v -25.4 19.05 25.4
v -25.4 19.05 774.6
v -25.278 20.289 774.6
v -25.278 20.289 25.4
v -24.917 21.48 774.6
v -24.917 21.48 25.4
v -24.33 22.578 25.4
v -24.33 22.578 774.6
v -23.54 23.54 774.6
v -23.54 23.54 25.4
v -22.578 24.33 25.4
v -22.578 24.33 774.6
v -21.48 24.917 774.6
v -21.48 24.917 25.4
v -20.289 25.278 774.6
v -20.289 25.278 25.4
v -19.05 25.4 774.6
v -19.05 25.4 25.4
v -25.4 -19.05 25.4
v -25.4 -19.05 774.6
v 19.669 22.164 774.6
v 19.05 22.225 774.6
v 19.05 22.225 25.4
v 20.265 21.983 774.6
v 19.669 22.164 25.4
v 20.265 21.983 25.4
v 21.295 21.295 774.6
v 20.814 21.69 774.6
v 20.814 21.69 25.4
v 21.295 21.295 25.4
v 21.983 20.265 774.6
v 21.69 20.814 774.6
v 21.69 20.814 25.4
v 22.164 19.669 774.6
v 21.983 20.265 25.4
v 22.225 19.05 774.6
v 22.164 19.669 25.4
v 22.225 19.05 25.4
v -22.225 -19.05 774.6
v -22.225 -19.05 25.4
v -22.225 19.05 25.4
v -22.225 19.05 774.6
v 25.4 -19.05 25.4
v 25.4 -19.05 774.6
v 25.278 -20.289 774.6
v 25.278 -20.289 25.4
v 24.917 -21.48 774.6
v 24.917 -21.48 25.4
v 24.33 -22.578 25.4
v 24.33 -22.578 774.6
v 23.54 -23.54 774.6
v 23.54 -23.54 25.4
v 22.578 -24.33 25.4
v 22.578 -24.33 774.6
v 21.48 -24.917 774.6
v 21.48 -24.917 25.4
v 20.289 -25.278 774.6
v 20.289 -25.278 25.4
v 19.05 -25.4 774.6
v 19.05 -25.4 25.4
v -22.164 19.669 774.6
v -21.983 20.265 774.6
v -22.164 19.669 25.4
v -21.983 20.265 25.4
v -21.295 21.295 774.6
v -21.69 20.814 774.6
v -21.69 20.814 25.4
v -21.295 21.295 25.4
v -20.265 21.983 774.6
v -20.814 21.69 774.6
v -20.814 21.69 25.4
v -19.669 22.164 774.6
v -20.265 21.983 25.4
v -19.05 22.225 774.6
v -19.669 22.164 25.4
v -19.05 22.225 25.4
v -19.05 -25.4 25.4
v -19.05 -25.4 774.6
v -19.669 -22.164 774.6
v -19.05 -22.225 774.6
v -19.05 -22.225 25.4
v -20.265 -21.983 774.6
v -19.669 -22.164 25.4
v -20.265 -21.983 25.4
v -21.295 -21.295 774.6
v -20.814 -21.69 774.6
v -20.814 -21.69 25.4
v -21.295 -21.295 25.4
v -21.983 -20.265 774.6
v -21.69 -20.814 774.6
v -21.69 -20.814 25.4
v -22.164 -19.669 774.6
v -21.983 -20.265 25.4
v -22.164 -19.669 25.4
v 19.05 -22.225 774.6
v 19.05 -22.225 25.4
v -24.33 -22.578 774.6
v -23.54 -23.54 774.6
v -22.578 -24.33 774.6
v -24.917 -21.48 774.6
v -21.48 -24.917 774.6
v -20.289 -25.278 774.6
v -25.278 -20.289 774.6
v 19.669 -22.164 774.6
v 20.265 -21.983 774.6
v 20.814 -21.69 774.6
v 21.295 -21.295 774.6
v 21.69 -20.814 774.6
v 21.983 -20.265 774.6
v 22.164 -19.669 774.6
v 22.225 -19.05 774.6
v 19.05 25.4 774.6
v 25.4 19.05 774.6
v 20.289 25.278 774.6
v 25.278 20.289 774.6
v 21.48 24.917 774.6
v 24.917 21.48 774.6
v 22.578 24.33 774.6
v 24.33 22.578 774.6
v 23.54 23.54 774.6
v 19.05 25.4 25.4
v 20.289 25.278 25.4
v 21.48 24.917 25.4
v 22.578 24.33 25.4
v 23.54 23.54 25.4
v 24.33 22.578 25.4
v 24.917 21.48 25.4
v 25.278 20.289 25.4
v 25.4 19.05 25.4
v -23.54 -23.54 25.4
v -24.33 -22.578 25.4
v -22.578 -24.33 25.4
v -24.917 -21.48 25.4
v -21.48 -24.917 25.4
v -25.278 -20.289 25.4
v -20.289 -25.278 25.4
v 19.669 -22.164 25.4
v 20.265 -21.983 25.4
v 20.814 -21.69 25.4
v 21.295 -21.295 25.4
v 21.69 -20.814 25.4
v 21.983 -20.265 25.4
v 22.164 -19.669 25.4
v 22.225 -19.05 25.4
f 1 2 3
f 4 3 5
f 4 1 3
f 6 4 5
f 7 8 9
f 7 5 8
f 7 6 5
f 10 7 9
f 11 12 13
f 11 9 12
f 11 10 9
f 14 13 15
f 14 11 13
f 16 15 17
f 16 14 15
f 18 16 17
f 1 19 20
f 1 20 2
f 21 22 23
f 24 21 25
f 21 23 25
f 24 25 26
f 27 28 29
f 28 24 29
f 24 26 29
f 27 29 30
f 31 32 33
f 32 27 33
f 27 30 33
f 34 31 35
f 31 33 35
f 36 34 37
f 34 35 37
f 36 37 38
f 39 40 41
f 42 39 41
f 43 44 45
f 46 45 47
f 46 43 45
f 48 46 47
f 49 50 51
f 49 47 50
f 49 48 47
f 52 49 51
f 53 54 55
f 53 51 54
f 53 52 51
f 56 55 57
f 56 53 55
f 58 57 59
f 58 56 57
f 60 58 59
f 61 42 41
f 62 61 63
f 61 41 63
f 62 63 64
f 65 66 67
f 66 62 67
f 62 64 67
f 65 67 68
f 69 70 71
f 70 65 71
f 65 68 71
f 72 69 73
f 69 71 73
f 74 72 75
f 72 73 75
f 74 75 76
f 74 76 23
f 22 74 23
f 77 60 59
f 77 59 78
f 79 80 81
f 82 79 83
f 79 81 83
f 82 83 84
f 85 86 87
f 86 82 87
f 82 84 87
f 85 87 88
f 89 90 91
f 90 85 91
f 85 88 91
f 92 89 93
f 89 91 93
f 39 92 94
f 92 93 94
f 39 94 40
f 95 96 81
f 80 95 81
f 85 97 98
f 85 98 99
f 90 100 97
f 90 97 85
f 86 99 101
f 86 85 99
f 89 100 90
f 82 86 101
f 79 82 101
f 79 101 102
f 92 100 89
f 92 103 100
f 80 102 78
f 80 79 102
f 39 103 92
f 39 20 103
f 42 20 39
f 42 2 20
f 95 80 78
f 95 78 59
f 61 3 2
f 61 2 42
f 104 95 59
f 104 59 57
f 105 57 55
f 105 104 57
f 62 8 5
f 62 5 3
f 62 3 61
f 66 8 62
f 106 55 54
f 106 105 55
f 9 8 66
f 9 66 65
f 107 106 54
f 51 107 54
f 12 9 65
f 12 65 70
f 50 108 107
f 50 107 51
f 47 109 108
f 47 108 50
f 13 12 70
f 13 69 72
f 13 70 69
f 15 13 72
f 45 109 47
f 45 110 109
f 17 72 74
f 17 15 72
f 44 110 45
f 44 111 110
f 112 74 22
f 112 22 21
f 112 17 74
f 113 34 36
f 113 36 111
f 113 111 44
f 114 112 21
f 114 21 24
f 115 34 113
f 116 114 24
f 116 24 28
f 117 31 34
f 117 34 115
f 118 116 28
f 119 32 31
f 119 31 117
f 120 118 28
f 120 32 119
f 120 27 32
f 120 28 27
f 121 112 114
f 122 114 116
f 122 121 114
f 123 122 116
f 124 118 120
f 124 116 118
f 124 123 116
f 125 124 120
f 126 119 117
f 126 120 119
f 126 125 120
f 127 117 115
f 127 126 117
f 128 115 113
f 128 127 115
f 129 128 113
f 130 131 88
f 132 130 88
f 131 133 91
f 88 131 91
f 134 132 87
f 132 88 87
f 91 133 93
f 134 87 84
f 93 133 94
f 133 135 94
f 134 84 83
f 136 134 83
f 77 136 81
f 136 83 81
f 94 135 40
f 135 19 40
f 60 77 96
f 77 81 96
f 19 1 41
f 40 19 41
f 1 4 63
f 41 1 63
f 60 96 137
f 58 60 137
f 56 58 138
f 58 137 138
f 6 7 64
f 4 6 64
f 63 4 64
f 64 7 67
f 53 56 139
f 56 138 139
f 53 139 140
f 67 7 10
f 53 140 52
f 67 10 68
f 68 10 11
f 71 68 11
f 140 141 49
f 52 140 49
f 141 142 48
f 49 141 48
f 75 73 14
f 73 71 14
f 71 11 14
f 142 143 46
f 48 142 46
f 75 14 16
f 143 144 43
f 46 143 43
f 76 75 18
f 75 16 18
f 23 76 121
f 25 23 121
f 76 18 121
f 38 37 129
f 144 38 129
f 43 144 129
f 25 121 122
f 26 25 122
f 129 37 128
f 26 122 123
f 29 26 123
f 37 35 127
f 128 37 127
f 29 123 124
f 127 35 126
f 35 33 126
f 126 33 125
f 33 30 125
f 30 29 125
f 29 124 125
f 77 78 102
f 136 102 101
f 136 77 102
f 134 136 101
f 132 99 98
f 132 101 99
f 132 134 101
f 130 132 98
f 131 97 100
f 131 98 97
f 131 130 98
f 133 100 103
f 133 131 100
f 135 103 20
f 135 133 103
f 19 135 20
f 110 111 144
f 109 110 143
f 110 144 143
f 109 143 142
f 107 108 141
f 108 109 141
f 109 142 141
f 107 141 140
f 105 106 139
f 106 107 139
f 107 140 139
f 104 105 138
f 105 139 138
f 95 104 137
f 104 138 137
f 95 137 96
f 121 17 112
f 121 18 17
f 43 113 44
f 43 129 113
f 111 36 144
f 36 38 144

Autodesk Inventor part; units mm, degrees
ref_plane "Plano inicial" through (0, 0, 25.4) normal (0, 0, 1) x (1, 0, 0)
ref_plane "Plano final" through (0, 0, 774.6) normal (0, 0, 1) x (1, 0, 0)
sketch "Boceto" plane through (0, 0, 0) normal (0, 0, 1) x (1, 0, 0)
  line L0 (-25.4, -19.05) -> (-25.4, 19.05)
  line L1 (-19.05, 25.4) -> (19.05, 25.4)
  line L2 (25.4, 19.05) -> (25.4, -19.05)
  line L3 (19.05, -25.4) -> (-19.05, -25.4)
  arc A0 (-25.4, -19.05) -> (-19.05, -25.4) centre (-19.05, -19.05) ccw
  arc A1 (-19.05, 25.4) -> (-25.4, 19.05) centre (-19.05, 19.05) ccw
  arc A2 (25.4, 19.05) -> (19.05, 25.4) centre (19.05, 19.05) ccw
  arc A3 (19.05, -25.4) -> (25.4, -19.05) centre (19.05, -19.05) ccw
  arc A4 (-19.05, 22.225) -> (-22.225, 19.05) centre (-19.05, 19.05) ccw
  line L4 (-19.05, 22.225) -> (19.05, 22.225)
  arc A5 (22.225, 19.05) -> (19.05, 22.225) centre (19.05, 19.05) ccw
  line L5 (22.225, 19.05) -> (22.225, -19.05)
  arc A6 (19.05, -22.225) -> (22.225, -19.05) centre (19.05, -19.05) ccw
  line L6 (19.05, -22.225) -> (-19.05, -22.225)
  arc A7 (-22.225, -19.05) -> (-19.05, -22.225) centre (-19.05, -19.05) ccw
  line L7 (-22.225, -19.05) -> (-22.225, 19.05)
  line L8 (0, 37.4012) -> (0, -37.4012) construction
  line L9 (-37.4012, 0) -> (37.4012, 0) construction
  dimension "d10" = 50.8
  dimension "d11" = 50.8
  dimension "d12" = 3.175
  dimension "d15" = 25.4
  dimension "d16" = 25.4
  dimension "d17" = 6.35
extrude "Cuerpo" add sketch "Boceto" along normal up to surface (749.2 mm away) from surface at 25.4
sketch "Sketch3" plane through (0, 0, 0) normal (0, 0, 1) x (1, 0, 0)
  line L0 (0, 0) -> (10, 0)
ref_plane "Work Plane3" through (0, 0, 0) normal (0, -1, 0) x (1, 0, 0)
ref_plane "Plano de trabajo4" through (19.05, 0, 25.4) normal (0, 0, -1) x (-1, 0, 0)
split "Dividir1" plane through (19.05, 0, 25.4) removes the side toward (0, 0, -1)
ref_plane "Plano de trabajo5" through (19.05, 400, 774.6) normal (0, 0, 1) x (1, 0, 0)
split "Dividir2" plane through (19.05, 400, 774.6) removes the side toward (0, 0, 1)
sketch "Sketch4" plane through (0, 0, 0) normal (0, -1, 0) x (1, 0, 0)
  line L0 (-2, 25.4) -> (12, 25.4) projected
  line L1 (-2, 774.6) -> (12, 774.6) projected
  dimension "d19" = 749.2
equation "\"d10\" = G_H"
equation "\"d11\" = G_W"
equation "\"d12\" = G_T"
equation "\"d15\" = 0.5 * d10"
equation "\"d16\" = 0.5 * d11"
equation "\"d17\" = G_IR"
equation "\"d3\" = G_L"
equation "\"G_W\" = 50.8"
equation "\"G_H\" = 50.8"
equation "\"G_T\" = 3.175"
equation "\"G_IR\" = 6.35"
equation "\"G_L\" = d19"
equation "\"G_OFFSET_START\" = -25.4"
equation "\"G_OFFSET_END\" = -25.4"
equation "\"d13\" = -G_OFFSET_START"
equation "\"d14\" = G_OFFSET_END + B_L"
equation "\"B_L\" = 800"
properties part number "AISC - 2 x 2 x 1/8 - 29,496" material "Acero, suave"
